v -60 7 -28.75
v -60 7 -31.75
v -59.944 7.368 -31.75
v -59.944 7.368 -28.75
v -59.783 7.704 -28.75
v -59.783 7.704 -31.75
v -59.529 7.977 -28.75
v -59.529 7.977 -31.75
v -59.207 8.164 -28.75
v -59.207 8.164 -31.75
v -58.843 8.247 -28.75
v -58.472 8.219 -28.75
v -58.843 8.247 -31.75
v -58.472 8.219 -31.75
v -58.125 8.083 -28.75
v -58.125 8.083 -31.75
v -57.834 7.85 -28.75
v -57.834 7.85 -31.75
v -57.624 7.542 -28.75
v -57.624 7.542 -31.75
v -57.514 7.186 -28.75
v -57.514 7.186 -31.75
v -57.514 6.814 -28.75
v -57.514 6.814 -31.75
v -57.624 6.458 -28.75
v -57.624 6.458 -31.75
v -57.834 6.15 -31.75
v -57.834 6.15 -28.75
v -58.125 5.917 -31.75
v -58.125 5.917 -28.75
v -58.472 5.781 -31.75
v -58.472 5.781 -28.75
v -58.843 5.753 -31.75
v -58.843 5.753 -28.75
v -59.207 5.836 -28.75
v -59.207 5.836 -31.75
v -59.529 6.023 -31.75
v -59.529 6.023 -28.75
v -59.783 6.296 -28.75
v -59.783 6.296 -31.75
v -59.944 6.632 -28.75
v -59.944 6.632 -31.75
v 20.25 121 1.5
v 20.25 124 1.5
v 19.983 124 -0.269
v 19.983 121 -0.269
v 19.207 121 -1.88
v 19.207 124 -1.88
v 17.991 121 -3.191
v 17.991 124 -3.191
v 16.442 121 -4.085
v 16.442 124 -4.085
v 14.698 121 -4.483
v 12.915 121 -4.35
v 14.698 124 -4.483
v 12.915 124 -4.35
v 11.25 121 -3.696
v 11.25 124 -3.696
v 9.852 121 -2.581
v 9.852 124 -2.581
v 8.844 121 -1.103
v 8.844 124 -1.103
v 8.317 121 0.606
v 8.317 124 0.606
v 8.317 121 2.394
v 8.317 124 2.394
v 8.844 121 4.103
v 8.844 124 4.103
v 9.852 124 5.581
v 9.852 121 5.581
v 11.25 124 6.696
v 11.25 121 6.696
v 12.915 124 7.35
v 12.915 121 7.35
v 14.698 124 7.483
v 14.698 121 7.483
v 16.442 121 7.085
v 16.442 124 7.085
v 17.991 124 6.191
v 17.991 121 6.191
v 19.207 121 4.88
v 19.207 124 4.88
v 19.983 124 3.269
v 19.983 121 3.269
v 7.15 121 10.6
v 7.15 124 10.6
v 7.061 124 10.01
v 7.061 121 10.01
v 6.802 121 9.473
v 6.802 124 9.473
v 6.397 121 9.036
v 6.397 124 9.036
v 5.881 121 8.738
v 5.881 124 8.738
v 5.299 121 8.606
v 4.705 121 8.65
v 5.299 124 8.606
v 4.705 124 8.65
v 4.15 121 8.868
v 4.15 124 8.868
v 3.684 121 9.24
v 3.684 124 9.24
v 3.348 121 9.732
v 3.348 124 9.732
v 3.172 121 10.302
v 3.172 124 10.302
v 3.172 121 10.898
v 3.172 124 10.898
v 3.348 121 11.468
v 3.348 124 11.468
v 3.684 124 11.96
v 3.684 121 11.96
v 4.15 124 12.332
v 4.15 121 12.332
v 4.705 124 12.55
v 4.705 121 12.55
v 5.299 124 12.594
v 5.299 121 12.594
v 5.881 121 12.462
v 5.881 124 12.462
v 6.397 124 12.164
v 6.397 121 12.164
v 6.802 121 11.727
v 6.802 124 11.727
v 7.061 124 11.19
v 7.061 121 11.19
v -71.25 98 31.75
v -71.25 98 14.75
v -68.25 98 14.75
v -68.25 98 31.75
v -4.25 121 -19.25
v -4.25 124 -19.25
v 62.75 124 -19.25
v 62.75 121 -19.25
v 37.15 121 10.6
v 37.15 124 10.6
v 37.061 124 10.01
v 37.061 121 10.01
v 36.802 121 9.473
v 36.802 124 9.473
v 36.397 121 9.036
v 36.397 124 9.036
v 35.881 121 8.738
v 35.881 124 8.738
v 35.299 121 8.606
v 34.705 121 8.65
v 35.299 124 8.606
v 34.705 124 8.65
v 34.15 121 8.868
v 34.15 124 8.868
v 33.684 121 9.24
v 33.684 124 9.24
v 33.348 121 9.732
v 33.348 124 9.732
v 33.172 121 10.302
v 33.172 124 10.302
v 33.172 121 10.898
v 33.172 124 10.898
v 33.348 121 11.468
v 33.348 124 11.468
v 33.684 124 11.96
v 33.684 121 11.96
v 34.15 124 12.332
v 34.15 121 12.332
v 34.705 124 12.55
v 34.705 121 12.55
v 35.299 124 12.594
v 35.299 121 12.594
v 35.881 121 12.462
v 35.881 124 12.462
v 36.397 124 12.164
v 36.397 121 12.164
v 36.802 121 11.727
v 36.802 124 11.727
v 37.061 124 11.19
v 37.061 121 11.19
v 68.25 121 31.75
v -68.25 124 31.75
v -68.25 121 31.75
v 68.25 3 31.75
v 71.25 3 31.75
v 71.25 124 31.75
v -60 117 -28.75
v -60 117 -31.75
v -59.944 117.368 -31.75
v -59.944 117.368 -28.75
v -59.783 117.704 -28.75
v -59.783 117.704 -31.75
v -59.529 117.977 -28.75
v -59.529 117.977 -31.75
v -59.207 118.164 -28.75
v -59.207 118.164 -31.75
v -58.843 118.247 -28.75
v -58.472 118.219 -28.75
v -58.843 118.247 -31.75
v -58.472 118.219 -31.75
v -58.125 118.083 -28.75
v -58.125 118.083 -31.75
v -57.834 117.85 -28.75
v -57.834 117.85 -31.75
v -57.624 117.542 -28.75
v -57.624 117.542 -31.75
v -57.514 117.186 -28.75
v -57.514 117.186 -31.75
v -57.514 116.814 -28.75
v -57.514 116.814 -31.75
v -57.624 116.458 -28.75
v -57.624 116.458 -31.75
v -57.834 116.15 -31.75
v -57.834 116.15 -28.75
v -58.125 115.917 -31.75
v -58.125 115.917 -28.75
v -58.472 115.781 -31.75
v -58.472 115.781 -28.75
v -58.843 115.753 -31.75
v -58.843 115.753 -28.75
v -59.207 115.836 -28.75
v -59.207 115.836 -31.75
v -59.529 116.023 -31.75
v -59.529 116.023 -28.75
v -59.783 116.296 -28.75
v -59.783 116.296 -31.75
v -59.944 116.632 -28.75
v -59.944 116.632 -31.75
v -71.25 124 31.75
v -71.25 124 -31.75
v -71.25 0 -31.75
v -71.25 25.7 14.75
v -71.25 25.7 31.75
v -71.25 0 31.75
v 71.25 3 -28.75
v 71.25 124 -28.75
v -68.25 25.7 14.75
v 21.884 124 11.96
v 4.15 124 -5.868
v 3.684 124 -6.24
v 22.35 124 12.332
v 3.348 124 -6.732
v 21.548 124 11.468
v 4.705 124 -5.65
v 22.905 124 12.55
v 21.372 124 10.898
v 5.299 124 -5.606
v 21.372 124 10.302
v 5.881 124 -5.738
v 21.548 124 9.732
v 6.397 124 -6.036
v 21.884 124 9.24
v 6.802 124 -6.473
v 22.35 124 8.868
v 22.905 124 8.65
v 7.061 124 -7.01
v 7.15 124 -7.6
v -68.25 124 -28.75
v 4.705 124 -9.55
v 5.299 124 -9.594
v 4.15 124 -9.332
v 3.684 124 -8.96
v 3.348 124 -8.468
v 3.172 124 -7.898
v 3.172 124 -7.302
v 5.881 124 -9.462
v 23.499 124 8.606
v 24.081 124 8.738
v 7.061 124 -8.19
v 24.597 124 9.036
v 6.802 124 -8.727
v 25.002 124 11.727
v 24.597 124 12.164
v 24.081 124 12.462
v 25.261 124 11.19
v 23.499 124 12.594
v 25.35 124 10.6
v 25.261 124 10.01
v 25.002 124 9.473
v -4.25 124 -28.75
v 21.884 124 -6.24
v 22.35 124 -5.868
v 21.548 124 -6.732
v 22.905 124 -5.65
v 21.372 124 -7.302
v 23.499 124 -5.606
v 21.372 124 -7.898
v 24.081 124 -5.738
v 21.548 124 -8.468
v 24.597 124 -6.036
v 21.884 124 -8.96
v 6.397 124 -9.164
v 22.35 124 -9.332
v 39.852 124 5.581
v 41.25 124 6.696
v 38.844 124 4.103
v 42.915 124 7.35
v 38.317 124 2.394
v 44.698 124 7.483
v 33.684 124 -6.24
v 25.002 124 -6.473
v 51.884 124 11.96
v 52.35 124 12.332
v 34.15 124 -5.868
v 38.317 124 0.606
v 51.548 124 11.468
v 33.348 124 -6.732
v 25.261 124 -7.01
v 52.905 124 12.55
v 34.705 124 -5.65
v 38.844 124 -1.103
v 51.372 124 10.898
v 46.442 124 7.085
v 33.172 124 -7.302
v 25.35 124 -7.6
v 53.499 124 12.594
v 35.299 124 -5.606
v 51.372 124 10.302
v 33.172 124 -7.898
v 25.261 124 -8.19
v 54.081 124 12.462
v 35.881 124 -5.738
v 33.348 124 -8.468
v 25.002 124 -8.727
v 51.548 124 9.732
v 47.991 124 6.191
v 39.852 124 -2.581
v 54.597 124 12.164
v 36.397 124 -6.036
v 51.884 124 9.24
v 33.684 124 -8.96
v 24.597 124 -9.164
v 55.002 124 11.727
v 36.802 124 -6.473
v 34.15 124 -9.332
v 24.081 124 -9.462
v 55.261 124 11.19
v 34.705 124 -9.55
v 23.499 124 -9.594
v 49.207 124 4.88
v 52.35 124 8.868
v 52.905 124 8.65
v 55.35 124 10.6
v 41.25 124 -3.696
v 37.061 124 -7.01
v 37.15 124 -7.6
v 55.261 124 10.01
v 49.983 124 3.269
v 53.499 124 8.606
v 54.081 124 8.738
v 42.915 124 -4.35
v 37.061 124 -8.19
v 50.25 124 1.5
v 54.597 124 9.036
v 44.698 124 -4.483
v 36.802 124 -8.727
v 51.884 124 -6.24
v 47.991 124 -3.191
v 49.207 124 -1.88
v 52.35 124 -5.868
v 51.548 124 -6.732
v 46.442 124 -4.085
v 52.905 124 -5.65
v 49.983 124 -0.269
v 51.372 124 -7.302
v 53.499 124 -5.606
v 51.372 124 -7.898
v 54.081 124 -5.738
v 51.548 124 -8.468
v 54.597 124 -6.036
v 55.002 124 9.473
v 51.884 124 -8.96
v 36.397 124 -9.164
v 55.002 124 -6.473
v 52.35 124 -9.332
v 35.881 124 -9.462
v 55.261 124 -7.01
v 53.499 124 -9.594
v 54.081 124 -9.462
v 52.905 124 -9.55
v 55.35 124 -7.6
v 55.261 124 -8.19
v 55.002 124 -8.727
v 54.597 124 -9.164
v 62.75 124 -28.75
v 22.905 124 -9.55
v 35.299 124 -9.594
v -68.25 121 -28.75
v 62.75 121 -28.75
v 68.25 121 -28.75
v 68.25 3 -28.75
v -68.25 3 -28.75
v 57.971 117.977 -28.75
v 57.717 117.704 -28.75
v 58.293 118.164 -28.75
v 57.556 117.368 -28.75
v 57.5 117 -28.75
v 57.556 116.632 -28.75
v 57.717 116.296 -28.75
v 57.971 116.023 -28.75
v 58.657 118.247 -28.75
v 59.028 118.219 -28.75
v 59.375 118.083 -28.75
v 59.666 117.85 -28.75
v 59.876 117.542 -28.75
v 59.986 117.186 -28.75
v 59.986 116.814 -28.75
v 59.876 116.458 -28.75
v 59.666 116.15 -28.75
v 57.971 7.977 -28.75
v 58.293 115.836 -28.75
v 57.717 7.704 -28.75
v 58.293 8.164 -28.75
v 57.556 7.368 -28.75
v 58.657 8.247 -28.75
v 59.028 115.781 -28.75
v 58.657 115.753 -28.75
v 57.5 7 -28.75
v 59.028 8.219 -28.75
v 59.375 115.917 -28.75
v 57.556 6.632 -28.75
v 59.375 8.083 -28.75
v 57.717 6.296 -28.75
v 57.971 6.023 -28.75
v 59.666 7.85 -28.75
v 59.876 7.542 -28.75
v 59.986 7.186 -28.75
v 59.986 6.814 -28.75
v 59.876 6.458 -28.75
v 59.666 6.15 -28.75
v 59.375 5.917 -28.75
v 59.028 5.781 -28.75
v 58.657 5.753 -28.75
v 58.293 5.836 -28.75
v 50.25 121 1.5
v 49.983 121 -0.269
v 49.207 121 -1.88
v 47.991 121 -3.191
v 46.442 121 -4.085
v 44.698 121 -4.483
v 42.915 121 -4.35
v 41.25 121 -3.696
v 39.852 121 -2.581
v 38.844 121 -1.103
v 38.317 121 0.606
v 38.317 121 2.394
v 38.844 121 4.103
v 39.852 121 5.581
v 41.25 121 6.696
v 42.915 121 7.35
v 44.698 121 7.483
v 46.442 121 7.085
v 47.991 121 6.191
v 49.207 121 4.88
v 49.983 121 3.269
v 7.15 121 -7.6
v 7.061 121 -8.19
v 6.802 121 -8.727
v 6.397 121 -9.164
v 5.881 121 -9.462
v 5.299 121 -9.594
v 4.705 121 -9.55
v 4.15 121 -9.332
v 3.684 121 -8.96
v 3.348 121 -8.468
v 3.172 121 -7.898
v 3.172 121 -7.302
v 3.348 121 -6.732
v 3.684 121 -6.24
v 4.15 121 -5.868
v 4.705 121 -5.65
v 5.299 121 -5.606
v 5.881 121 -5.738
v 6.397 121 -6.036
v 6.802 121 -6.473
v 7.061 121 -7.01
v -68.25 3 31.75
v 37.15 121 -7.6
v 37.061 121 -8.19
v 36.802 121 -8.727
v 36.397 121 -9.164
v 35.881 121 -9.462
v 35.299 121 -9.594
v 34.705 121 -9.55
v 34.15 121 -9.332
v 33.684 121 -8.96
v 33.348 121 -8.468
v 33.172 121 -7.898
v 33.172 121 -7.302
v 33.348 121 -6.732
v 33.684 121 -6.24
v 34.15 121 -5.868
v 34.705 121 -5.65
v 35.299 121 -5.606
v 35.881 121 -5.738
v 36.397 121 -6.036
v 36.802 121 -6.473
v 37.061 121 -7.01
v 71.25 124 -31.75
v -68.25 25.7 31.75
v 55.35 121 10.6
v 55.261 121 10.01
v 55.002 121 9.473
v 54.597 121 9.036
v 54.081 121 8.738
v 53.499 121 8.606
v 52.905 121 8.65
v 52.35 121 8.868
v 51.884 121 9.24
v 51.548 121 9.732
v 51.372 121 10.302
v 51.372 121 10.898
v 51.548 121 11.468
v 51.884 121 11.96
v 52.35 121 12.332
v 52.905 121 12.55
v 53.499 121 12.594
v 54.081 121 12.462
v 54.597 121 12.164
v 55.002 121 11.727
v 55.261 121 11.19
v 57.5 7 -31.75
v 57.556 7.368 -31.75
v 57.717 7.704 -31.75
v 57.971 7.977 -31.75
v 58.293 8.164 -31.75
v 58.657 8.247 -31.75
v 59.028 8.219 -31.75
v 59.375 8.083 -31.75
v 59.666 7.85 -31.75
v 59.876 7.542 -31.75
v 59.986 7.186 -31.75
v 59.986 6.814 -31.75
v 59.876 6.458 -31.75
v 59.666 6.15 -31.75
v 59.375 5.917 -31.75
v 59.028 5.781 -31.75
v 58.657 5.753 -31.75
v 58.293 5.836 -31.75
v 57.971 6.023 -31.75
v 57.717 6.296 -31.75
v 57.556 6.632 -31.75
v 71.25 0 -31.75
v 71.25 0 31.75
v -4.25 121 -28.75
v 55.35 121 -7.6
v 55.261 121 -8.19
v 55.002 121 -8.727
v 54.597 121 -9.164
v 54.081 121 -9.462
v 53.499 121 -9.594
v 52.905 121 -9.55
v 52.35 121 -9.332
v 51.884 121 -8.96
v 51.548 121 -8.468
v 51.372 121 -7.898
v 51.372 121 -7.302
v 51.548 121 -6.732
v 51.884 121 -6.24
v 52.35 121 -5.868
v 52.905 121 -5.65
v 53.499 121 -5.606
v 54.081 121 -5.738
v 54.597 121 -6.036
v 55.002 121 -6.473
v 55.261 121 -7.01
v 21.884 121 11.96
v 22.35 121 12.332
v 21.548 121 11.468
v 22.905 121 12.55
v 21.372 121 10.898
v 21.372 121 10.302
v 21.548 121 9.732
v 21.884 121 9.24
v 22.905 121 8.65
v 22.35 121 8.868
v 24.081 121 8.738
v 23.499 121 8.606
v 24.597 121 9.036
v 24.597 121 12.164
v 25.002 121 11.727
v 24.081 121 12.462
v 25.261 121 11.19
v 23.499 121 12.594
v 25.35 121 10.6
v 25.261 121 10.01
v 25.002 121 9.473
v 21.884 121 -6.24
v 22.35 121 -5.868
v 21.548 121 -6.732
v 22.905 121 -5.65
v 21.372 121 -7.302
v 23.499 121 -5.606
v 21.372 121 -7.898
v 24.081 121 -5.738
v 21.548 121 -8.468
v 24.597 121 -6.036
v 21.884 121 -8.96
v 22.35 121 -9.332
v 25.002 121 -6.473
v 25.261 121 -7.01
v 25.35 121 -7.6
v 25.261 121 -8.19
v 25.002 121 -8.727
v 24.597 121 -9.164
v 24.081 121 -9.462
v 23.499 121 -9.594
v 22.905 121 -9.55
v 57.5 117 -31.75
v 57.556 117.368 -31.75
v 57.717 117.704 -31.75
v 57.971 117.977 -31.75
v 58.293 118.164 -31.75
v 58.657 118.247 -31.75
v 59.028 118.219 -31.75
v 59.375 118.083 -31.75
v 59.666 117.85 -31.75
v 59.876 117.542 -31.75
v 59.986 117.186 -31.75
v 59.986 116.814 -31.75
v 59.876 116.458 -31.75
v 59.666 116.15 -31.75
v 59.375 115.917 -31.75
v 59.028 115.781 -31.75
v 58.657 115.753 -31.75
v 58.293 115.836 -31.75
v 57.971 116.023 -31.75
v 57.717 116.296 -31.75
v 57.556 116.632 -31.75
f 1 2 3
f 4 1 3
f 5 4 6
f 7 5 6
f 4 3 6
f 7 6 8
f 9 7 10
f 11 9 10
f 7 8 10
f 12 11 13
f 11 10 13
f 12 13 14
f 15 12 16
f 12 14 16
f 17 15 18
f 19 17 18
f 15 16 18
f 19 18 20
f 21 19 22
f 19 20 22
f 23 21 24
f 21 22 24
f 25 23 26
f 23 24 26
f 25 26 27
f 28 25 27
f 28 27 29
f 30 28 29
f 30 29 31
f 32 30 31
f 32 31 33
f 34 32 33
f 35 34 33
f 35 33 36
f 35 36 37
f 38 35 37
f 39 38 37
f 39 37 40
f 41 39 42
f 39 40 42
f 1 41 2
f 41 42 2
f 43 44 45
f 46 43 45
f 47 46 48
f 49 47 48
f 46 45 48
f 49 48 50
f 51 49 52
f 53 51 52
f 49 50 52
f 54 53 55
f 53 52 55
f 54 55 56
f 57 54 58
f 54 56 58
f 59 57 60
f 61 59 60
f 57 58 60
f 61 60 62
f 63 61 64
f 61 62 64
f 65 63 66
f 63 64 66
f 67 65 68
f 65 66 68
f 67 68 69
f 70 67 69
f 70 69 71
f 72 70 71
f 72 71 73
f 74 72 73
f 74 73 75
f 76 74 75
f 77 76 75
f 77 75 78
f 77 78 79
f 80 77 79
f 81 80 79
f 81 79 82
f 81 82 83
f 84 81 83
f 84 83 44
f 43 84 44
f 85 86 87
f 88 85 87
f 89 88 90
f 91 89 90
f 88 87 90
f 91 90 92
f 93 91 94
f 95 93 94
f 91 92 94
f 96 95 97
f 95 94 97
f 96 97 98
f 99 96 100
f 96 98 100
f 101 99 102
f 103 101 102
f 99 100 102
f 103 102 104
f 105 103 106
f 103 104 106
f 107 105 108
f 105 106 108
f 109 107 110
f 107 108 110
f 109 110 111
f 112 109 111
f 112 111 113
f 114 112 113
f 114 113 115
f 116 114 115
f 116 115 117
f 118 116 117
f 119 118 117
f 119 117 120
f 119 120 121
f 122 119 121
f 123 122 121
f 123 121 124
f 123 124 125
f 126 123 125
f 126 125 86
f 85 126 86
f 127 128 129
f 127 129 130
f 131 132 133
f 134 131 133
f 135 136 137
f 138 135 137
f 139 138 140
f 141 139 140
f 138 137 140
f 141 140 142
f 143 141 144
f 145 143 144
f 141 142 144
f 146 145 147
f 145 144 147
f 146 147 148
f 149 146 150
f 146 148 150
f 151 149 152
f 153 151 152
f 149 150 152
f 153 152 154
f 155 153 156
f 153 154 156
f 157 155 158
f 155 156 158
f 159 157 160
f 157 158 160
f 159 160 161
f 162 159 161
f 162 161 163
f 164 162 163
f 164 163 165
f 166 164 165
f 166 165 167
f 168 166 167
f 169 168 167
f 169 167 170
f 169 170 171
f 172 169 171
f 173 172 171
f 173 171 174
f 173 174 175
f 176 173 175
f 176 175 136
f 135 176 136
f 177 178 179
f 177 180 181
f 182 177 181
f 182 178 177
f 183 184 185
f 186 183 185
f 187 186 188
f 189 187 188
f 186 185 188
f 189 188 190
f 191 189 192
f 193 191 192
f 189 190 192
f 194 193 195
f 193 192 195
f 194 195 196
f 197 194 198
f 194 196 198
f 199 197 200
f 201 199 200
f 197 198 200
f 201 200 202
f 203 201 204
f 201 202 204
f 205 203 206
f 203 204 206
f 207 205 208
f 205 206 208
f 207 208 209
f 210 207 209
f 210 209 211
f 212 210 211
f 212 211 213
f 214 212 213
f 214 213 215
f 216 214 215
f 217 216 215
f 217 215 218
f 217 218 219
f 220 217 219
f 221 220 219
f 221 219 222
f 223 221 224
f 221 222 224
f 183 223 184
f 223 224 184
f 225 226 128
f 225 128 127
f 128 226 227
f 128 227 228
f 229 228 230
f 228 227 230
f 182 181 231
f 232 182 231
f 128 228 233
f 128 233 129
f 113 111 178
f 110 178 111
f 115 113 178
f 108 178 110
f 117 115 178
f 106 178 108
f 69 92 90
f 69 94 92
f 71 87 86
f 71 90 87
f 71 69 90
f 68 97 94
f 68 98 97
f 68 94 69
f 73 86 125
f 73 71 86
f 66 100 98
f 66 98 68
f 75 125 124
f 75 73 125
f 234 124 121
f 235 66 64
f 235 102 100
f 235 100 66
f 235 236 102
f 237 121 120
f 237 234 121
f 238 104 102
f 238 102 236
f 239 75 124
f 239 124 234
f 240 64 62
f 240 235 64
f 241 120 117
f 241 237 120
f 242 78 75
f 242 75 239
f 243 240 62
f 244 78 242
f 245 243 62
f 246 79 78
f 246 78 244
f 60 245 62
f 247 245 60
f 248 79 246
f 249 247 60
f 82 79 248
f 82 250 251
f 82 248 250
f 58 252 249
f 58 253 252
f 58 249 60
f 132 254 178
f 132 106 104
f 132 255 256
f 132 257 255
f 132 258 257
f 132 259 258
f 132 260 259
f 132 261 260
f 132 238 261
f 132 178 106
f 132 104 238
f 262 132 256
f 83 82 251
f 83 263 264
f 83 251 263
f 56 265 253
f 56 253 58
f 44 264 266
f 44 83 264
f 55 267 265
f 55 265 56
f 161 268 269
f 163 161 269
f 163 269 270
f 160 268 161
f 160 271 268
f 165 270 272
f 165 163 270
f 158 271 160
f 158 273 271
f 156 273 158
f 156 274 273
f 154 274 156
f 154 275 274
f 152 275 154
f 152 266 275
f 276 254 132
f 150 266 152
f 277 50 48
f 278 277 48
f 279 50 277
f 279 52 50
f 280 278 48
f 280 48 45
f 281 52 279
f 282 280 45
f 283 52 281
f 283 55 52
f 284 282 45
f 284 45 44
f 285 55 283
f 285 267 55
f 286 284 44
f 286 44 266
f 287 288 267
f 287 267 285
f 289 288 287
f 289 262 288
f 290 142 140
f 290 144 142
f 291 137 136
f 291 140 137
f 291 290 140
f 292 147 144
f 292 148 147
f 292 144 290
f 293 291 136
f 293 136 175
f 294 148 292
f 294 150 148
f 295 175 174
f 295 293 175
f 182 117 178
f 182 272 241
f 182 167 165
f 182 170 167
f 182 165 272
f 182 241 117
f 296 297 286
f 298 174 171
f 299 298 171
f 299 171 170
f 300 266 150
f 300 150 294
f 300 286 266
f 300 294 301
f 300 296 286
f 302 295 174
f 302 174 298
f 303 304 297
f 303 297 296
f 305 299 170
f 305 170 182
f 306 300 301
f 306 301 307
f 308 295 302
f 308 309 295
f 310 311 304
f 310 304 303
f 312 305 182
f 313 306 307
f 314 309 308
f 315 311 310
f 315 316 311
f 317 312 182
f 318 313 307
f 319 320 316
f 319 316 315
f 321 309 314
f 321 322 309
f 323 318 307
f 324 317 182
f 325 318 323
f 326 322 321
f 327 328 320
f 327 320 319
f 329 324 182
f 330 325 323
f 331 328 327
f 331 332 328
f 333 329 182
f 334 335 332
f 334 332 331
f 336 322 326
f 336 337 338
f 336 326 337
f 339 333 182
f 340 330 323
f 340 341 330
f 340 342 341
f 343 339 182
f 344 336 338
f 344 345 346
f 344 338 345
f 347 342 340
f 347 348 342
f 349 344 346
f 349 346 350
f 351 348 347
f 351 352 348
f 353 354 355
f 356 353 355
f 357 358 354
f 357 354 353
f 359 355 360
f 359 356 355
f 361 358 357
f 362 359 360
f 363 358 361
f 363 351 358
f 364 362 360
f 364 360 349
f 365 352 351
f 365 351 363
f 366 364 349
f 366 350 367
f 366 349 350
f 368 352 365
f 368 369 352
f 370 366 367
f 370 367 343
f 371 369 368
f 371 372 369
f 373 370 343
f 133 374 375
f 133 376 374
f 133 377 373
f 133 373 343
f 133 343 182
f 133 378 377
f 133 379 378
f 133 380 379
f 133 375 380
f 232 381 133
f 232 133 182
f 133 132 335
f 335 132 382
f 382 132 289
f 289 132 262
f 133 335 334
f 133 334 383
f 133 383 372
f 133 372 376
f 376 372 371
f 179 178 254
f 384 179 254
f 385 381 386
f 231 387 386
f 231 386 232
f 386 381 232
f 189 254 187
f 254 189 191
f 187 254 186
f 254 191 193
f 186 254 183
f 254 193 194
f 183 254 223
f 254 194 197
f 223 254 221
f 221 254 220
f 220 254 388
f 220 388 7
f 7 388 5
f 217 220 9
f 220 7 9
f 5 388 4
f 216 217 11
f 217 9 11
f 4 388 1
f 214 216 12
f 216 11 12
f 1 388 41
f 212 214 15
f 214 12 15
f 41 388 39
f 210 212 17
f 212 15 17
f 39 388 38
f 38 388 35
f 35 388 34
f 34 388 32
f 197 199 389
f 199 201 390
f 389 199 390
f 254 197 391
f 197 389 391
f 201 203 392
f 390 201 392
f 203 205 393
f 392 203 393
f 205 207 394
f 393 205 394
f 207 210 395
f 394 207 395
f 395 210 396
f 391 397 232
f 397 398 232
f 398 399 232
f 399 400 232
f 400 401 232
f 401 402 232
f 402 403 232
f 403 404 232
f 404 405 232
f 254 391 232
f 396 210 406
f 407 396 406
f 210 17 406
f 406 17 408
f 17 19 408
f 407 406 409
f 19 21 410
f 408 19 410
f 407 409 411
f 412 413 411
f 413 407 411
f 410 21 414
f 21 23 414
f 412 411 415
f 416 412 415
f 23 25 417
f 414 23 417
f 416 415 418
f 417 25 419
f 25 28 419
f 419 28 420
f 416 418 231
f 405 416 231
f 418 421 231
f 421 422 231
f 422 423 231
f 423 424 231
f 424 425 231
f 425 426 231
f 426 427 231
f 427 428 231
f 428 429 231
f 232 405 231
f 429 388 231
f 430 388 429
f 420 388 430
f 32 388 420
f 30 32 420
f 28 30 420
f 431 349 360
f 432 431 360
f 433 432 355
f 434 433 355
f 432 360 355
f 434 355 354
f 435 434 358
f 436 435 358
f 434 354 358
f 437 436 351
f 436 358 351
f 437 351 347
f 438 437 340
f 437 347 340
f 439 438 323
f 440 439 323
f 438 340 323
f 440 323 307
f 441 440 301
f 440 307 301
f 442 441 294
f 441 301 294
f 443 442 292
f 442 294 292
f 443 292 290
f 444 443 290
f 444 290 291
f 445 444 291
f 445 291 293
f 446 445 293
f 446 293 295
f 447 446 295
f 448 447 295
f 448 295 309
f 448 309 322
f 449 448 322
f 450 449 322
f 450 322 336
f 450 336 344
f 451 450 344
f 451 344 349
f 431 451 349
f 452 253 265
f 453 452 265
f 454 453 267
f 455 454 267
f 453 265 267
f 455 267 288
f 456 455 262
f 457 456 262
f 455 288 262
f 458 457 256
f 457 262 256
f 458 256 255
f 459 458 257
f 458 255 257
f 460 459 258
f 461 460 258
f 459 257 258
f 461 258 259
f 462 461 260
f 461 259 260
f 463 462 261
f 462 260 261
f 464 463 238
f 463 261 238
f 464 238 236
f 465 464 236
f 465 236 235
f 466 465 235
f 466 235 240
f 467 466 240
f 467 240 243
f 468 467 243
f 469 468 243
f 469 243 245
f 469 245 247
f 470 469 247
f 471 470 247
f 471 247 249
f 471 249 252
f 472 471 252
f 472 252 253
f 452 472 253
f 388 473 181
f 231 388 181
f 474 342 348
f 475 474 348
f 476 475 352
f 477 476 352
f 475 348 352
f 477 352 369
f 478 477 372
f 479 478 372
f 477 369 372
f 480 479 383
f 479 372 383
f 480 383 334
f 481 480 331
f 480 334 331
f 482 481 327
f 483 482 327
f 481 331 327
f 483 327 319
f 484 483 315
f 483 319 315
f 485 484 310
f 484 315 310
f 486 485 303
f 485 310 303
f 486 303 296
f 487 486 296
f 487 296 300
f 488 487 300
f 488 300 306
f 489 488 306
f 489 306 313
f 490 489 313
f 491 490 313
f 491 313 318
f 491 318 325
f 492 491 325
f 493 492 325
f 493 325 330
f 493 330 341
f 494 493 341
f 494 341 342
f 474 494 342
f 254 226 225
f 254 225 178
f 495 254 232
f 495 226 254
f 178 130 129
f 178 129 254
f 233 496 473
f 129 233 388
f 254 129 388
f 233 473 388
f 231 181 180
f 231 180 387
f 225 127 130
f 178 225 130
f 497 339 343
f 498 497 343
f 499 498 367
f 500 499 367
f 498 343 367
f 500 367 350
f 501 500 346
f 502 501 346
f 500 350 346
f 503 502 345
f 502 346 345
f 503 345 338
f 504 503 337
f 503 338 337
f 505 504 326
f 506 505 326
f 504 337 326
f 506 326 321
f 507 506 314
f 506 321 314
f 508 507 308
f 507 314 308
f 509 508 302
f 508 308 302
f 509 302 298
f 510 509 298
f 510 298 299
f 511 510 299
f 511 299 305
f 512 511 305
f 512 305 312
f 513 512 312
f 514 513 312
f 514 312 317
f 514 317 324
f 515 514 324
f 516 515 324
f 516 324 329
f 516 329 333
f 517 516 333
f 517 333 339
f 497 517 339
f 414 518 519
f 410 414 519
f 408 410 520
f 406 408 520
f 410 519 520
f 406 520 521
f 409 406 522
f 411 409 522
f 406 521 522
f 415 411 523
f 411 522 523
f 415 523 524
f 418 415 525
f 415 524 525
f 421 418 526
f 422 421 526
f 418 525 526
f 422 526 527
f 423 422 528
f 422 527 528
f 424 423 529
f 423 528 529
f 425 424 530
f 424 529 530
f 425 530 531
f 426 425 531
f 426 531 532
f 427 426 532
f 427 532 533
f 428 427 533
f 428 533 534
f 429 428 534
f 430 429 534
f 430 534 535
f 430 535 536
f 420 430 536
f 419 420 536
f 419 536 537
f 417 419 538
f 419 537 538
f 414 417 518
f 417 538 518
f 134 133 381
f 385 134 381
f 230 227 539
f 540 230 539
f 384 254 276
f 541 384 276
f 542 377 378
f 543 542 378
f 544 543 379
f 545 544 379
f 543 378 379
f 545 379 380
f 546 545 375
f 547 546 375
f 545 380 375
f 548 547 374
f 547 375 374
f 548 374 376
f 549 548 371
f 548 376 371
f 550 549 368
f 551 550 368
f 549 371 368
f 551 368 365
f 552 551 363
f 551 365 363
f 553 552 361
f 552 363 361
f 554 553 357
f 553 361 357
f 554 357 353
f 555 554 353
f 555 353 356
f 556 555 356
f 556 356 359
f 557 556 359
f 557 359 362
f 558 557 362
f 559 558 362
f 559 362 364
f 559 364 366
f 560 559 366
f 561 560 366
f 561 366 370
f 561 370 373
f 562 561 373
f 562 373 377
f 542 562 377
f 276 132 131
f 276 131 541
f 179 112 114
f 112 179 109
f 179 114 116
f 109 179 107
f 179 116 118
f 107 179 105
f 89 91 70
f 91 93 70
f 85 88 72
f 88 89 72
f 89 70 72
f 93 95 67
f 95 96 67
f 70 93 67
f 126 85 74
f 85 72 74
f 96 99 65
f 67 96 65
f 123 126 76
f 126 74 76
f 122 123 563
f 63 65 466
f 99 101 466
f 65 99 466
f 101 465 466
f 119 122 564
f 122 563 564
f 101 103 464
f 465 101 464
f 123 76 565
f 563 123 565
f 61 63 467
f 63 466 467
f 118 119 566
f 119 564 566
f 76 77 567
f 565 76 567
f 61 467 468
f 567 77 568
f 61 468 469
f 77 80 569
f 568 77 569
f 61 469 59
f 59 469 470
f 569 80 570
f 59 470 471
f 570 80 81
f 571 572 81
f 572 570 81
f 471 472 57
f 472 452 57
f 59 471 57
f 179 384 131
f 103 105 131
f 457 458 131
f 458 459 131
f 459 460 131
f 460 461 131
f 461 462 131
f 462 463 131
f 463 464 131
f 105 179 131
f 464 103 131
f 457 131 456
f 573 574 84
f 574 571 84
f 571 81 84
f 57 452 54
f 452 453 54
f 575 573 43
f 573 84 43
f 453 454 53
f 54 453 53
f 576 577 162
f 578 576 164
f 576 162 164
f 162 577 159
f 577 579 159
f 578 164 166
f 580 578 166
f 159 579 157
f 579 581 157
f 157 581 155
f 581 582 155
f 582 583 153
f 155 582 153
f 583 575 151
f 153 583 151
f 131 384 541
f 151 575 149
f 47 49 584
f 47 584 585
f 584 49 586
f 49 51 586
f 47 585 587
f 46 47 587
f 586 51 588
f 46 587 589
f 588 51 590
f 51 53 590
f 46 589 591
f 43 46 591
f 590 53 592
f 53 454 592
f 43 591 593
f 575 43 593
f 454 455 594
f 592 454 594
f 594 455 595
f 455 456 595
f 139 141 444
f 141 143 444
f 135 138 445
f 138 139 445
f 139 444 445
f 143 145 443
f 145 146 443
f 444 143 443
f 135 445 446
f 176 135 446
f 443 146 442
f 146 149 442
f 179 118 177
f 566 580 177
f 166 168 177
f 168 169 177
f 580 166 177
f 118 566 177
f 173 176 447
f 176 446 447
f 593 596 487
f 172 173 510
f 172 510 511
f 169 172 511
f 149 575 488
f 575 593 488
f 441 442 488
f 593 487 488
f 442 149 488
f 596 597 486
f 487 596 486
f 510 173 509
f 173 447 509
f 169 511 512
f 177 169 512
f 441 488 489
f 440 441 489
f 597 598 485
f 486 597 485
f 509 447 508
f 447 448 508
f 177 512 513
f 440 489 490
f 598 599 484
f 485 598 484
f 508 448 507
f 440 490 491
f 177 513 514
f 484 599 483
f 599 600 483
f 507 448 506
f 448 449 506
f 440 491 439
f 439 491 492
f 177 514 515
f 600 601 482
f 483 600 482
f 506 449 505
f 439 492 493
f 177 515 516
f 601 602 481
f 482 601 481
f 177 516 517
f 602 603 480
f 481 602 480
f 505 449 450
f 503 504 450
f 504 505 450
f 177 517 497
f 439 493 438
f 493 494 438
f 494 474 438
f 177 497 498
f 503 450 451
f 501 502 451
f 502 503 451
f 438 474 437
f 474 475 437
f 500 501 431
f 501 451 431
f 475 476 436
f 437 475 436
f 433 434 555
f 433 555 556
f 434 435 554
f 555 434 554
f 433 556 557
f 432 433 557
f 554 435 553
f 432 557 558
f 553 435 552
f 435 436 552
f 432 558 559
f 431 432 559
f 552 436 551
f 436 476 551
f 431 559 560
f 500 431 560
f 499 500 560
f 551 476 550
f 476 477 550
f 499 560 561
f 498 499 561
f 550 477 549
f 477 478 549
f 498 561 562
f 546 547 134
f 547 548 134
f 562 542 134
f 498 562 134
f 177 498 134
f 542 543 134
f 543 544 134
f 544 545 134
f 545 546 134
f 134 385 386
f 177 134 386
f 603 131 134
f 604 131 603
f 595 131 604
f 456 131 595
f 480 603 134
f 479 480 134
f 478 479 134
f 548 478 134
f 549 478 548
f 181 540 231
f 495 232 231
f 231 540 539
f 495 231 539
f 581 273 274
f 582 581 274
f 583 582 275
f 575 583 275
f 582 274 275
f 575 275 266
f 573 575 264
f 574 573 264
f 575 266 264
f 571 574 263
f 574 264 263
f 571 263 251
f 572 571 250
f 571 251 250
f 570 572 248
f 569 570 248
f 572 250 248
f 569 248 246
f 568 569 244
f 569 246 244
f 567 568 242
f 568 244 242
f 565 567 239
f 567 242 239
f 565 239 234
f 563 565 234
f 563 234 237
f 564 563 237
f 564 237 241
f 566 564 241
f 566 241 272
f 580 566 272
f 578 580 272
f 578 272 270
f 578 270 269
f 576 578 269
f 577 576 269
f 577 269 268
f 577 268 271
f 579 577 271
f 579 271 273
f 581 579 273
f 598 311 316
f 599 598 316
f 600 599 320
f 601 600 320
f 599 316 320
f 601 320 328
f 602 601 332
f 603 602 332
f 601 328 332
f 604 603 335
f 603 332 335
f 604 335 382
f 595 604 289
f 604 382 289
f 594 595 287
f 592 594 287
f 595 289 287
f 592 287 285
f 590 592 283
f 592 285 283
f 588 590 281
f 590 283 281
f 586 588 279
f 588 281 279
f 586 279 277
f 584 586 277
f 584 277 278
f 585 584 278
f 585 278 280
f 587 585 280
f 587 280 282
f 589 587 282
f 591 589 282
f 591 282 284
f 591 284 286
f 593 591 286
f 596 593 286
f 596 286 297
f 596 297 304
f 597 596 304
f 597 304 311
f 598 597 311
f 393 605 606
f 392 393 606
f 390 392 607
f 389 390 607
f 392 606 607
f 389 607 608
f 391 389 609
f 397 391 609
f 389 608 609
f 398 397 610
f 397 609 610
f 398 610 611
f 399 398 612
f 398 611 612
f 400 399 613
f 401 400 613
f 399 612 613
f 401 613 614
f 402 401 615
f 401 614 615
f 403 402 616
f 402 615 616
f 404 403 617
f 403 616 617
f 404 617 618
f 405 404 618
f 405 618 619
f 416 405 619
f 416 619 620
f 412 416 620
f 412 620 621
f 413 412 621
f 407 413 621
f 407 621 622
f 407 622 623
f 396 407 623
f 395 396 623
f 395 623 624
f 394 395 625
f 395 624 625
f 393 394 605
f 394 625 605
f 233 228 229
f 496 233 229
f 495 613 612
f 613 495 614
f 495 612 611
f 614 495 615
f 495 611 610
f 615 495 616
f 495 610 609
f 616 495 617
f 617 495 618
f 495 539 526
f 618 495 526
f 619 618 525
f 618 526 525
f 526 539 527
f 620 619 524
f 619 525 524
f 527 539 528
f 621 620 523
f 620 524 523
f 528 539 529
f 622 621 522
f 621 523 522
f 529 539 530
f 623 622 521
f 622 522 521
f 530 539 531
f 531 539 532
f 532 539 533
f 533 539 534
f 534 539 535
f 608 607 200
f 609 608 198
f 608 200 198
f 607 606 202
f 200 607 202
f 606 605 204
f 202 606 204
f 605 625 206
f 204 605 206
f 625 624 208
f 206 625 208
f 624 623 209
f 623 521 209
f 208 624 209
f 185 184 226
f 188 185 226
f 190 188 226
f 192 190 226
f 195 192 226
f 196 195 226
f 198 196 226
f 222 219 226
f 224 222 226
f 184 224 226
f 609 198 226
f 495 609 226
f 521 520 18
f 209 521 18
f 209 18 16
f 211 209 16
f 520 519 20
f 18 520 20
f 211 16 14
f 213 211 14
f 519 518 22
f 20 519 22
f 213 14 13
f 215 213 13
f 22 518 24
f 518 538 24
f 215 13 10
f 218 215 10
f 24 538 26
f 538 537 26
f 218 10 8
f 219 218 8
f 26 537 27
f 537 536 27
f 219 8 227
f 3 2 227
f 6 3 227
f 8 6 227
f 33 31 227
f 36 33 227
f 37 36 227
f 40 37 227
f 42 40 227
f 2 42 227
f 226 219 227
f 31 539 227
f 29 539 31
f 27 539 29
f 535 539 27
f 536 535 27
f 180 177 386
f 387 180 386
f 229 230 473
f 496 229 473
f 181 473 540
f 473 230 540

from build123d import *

# Parameters (mm, degrees)
SALIENTE_EXTRUIR1_DEPTH = 124
CROQUIS2_W              = 142.5
CROQUIS2_H              = 63.5
SALIENTE_EXTRUIR2_DEPTH = 3
CROQUIS3_W              = 17
CROQUIS3_H              = 72.3
CORTAR_EXTRUIR1_DEPTH   = 3
CROQUIS4_W              = 139.5
CROQUIS4_H              = 60.5
SALIENTE_EXTRUIR4_DEPTH = 3
CROQUIS5_W              = 60.5
CROQUIS5_H              = 118
SALIENTE_EXTRUIR5_DEPTH = 3
CROQUIS6_R              = 1.25
CORTAR_EXTRUIR2_DEPTH   = 3
CROQUIS7_W              = 67
CROQUIS7_H              = 9.5
CORTAR_EXTRUIR3_DEPTH   = 3
CROQUIS9_R              = 1.25
CORTAR_EXTRUIR6_DEPTH   = 3
CROQUIS10_R             = 6
CROQUIS10_R_2           = 2
CORTAR_EXTRUIR7_DEPTH   = 10


with BuildPart() as part:
    # Croquis1 → Saliente-Extruir1 (new body)
    with BuildSketch(Plane(origin=(0, 0, 0), x_dir=(1, 0, 0), z_dir=(0, 1, 0))):
        Polygon((-68.25, -28.75), (-68.25, 28.75), (68.25, 28.75), (71.25, 28.75), (71.25, 31.75), (-71.25, 31.75), (-71.25, -31.75), (-68.25, -31.75), align=None)
    extrude(amount=SALIENTE_EXTRUIR1_DEPTH)

    # Croquis2 → Saliente-Extruir2 (add)
    with BuildSketch(Plane.XZ):
        Rectangle(CROQUIS2_W, CROQUIS2_H)
    extrude(amount=-SALIENTE_EXTRUIR2_DEPTH)

    # Croquis3 → Cortar-Extruir1 (cut)
    with BuildSketch(Plane.ZY.offset(71.25)):
        with Locations((23.25, 61.85)):
            Rectangle(CROQUIS3_W, CROQUIS3_H)
    extrude(amount=-CORTAR_EXTRUIR1_DEPTH, mode=Mode.SUBTRACT)

    # Croquis6 → Cortar-Extruir2 (cut)
    with BuildSketch(Plane(origin=(0, 0, -31.75), x_dir=(-1, 0, 0), z_dir=(0, 0, -1))):
        with Locations((-58.75, 117)):
            Circle(CROQUIS6_R)
        with Locations((58.75, 117)):
            Circle(CROQUIS6_R)
    extrude(amount=-CORTAR_EXTRUIR2_DEPTH, mode=Mode.SUBTRACT)

    # Croquis9 → Cortar-Extruir6 (cut)
    with BuildSketch(Plane(origin=(0, 0, -31.75), x_dir=(-1, 0, 0), z_dir=(0, 0, -1))):
        with Locations((58.75, 7)):
            Circle(CROQUIS9_R)
        with Locations((-58.75, 7)):
            Circle(CROQUIS9_R)
    extrude(amount=-CORTAR_EXTRUIR6_DEPTH, mode=Mode.SUBTRACT)


with BuildPart() as body_2:
    # Croquis4 → Saliente-Extruir4 (new body)
    with BuildSketch(Plane(origin=(0, 124, 0), x_dir=(1, 0, 0), z_dir=(0, 1, 0))):
        with Locations((1.5, -1.5)):
            Rectangle(CROQUIS4_W, CROQUIS4_H)
    extrude(amount=-SALIENTE_EXTRUIR4_DEPTH)

    # Croquis7 → Cortar-Extruir3 (cut)
    with BuildSketch(Plane(origin=(0, 124, 0), x_dir=(1, 0, 0), z_dir=(0, 1, 0))):
        with Locations((29.25, 24)):
            Rectangle(CROQUIS7_W, CROQUIS7_H)
    extrude(amount=-CORTAR_EXTRUIR3_DEPTH, mode=Mode.SUBTRACT)


with BuildPart() as body_3:
    # Croquis5 → Saliente-Extruir5 (new body)
    with BuildSketch(Plane(origin=(71.25, 0, 0), x_dir=(0, 0, -1), z_dir=(1, 0, 0))):
        with Locations((-1.5, 62)):
            Rectangle(CROQUIS5_W, CROQUIS5_H)
    extrude(amount=-SALIENTE_EXTRUIR5_DEPTH)

    # Combinar1: union body 2
    add(body_2.part)

    # Croquis10 → Cortar-Extruir7 (cut)
    with BuildSketch(Plane(origin=(0, 124, 0), x_dir=(1, 0, 0), z_dir=(0, 1, 0))):
        with Locations((14.25, -1.5)):
            Circle(CROQUIS10_R)
        with Locations((23.35, 7.6)):
            Circle(CROQUIS10_R_2)
        with Locations((5.15, 7.6)):
            Circle(CROQUIS10_R_2)
        with Locations((5.15, -10.6)):
            Circle(CROQUIS10_R_2)
        with Locations((23.35, -10.6)):
            Circle(CROQUIS10_R_2)
        with Locations((44.25, -1.5)):
            Circle(CROQUIS10_R)
        with Locations((53.35, 7.6)):
            Circle(CROQUIS10_R_2)
        with Locations((35.15, 7.6)):
            Circle(CROQUIS10_R_2)
        with Locations((35.15, -10.6)):
            Circle(CROQUIS10_R_2)
        with Locations((53.35, -10.6)):
            Circle(CROQUIS10_R_2)
    extrude(amount=-CORTAR_EXTRUIR7_DEPTH, mode=Mode.SUBTRACT)


solid = Compound([part.part, body_3.part])
